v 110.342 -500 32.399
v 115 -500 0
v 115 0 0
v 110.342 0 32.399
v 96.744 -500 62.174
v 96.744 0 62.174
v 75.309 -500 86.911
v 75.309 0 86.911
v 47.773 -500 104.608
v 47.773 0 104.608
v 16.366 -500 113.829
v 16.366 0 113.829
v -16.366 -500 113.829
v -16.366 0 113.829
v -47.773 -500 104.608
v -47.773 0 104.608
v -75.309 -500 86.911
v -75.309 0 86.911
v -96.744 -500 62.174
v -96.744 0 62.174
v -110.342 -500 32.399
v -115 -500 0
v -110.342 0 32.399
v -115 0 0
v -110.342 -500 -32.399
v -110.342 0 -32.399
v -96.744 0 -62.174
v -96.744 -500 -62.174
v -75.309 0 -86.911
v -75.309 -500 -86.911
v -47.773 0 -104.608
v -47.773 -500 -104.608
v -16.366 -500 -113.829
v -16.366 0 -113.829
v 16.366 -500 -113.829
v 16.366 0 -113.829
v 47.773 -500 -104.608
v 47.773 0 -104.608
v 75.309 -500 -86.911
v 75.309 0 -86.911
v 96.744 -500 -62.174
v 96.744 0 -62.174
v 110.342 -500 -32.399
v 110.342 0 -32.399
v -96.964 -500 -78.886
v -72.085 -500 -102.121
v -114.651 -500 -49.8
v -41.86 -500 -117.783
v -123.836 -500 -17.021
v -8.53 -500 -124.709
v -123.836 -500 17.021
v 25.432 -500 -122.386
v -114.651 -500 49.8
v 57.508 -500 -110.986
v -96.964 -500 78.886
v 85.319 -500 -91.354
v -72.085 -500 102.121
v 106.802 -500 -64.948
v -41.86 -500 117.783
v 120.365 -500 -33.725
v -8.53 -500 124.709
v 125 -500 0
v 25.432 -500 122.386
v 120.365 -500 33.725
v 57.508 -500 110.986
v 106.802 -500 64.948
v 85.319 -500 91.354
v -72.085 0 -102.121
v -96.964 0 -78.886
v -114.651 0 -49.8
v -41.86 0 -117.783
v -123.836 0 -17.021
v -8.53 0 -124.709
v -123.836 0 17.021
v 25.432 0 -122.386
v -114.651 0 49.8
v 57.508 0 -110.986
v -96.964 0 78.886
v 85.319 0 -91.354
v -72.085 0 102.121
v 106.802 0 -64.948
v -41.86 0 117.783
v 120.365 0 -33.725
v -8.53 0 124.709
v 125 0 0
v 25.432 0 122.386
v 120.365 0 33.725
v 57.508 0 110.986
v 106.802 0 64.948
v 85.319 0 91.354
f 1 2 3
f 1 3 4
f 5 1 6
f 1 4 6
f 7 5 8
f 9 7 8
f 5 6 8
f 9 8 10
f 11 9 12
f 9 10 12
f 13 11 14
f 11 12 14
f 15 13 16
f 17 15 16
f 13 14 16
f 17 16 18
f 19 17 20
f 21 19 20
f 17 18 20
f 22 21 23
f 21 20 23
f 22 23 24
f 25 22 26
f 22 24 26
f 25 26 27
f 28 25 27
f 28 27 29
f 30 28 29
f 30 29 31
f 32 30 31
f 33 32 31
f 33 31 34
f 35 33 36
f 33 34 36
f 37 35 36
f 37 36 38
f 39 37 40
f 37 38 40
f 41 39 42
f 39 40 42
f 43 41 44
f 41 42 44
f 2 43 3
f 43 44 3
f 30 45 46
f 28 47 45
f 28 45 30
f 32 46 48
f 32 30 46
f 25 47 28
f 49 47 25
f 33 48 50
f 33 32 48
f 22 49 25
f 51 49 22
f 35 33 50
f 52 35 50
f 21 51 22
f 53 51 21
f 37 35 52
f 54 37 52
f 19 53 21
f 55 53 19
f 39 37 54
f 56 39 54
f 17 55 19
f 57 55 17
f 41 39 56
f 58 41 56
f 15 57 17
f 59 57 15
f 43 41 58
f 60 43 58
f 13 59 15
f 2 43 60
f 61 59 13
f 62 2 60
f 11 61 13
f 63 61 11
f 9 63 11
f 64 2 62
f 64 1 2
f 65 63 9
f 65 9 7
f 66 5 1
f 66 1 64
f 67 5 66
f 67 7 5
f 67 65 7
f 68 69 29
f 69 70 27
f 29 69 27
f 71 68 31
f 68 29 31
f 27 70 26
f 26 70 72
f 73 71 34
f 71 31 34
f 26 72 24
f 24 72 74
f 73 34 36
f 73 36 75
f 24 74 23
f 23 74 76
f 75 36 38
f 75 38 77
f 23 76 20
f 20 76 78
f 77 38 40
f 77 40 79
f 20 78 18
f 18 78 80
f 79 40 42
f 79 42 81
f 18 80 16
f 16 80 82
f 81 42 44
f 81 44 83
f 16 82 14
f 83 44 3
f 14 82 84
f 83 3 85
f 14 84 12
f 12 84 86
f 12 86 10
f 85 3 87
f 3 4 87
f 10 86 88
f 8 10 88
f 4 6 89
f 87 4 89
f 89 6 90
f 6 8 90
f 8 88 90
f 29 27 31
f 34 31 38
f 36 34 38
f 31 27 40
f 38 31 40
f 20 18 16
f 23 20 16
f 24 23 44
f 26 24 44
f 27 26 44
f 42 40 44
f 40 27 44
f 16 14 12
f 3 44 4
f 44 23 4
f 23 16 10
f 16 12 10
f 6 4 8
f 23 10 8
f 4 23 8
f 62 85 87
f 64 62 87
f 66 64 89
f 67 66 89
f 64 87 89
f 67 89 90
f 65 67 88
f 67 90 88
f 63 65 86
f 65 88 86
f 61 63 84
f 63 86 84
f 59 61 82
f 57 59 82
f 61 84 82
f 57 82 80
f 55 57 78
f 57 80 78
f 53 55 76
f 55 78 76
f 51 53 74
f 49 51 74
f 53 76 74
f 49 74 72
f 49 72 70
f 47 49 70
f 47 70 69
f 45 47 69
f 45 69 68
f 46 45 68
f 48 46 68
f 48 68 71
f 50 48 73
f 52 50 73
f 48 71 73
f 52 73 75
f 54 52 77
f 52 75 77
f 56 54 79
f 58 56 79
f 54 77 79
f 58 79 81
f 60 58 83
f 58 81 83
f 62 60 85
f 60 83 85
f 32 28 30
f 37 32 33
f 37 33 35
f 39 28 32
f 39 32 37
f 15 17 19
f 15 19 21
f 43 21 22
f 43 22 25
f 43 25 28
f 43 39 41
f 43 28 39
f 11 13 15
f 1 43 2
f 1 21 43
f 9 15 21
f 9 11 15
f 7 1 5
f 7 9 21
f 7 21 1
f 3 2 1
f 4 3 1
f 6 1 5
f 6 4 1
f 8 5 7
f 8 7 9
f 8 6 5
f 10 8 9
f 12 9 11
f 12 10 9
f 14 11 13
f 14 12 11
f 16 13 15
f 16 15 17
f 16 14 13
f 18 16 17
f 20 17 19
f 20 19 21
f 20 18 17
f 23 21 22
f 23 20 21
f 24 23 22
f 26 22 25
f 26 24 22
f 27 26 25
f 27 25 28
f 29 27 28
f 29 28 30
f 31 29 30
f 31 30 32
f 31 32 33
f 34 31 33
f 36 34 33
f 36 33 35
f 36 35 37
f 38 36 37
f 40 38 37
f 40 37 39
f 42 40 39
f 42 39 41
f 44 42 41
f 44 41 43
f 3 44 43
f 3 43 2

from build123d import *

# Parameters (mm, degrees)
F0_R     = 125
F1_DEPTH = 500
F2_T     = -10
F3_R     = 115
F4_DEPTH = 500


with BuildPart() as f1:
    # F0 (on Front) → F1 (new body)
    with BuildSketch(Plane.XZ):
        Circle(F0_R)
    extrude(amount=F1_DEPTH)

    # F2
    f2_openings = [f1.faces().sort_by_distance(p)[0] for p in [
        (0, -500, 0),
        (0, 0, 0),
    ]]
    offset(amount=F2_T, openings=f2_openings)


with BuildPart() as f4:
    # F3 (on Front) → F4 (new body)
    with BuildSketch(Plane.XZ):
        Circle(F3_R)
    extrude(amount=F4_DEPTH)


solid = Compound([f1.part, f4.part])
